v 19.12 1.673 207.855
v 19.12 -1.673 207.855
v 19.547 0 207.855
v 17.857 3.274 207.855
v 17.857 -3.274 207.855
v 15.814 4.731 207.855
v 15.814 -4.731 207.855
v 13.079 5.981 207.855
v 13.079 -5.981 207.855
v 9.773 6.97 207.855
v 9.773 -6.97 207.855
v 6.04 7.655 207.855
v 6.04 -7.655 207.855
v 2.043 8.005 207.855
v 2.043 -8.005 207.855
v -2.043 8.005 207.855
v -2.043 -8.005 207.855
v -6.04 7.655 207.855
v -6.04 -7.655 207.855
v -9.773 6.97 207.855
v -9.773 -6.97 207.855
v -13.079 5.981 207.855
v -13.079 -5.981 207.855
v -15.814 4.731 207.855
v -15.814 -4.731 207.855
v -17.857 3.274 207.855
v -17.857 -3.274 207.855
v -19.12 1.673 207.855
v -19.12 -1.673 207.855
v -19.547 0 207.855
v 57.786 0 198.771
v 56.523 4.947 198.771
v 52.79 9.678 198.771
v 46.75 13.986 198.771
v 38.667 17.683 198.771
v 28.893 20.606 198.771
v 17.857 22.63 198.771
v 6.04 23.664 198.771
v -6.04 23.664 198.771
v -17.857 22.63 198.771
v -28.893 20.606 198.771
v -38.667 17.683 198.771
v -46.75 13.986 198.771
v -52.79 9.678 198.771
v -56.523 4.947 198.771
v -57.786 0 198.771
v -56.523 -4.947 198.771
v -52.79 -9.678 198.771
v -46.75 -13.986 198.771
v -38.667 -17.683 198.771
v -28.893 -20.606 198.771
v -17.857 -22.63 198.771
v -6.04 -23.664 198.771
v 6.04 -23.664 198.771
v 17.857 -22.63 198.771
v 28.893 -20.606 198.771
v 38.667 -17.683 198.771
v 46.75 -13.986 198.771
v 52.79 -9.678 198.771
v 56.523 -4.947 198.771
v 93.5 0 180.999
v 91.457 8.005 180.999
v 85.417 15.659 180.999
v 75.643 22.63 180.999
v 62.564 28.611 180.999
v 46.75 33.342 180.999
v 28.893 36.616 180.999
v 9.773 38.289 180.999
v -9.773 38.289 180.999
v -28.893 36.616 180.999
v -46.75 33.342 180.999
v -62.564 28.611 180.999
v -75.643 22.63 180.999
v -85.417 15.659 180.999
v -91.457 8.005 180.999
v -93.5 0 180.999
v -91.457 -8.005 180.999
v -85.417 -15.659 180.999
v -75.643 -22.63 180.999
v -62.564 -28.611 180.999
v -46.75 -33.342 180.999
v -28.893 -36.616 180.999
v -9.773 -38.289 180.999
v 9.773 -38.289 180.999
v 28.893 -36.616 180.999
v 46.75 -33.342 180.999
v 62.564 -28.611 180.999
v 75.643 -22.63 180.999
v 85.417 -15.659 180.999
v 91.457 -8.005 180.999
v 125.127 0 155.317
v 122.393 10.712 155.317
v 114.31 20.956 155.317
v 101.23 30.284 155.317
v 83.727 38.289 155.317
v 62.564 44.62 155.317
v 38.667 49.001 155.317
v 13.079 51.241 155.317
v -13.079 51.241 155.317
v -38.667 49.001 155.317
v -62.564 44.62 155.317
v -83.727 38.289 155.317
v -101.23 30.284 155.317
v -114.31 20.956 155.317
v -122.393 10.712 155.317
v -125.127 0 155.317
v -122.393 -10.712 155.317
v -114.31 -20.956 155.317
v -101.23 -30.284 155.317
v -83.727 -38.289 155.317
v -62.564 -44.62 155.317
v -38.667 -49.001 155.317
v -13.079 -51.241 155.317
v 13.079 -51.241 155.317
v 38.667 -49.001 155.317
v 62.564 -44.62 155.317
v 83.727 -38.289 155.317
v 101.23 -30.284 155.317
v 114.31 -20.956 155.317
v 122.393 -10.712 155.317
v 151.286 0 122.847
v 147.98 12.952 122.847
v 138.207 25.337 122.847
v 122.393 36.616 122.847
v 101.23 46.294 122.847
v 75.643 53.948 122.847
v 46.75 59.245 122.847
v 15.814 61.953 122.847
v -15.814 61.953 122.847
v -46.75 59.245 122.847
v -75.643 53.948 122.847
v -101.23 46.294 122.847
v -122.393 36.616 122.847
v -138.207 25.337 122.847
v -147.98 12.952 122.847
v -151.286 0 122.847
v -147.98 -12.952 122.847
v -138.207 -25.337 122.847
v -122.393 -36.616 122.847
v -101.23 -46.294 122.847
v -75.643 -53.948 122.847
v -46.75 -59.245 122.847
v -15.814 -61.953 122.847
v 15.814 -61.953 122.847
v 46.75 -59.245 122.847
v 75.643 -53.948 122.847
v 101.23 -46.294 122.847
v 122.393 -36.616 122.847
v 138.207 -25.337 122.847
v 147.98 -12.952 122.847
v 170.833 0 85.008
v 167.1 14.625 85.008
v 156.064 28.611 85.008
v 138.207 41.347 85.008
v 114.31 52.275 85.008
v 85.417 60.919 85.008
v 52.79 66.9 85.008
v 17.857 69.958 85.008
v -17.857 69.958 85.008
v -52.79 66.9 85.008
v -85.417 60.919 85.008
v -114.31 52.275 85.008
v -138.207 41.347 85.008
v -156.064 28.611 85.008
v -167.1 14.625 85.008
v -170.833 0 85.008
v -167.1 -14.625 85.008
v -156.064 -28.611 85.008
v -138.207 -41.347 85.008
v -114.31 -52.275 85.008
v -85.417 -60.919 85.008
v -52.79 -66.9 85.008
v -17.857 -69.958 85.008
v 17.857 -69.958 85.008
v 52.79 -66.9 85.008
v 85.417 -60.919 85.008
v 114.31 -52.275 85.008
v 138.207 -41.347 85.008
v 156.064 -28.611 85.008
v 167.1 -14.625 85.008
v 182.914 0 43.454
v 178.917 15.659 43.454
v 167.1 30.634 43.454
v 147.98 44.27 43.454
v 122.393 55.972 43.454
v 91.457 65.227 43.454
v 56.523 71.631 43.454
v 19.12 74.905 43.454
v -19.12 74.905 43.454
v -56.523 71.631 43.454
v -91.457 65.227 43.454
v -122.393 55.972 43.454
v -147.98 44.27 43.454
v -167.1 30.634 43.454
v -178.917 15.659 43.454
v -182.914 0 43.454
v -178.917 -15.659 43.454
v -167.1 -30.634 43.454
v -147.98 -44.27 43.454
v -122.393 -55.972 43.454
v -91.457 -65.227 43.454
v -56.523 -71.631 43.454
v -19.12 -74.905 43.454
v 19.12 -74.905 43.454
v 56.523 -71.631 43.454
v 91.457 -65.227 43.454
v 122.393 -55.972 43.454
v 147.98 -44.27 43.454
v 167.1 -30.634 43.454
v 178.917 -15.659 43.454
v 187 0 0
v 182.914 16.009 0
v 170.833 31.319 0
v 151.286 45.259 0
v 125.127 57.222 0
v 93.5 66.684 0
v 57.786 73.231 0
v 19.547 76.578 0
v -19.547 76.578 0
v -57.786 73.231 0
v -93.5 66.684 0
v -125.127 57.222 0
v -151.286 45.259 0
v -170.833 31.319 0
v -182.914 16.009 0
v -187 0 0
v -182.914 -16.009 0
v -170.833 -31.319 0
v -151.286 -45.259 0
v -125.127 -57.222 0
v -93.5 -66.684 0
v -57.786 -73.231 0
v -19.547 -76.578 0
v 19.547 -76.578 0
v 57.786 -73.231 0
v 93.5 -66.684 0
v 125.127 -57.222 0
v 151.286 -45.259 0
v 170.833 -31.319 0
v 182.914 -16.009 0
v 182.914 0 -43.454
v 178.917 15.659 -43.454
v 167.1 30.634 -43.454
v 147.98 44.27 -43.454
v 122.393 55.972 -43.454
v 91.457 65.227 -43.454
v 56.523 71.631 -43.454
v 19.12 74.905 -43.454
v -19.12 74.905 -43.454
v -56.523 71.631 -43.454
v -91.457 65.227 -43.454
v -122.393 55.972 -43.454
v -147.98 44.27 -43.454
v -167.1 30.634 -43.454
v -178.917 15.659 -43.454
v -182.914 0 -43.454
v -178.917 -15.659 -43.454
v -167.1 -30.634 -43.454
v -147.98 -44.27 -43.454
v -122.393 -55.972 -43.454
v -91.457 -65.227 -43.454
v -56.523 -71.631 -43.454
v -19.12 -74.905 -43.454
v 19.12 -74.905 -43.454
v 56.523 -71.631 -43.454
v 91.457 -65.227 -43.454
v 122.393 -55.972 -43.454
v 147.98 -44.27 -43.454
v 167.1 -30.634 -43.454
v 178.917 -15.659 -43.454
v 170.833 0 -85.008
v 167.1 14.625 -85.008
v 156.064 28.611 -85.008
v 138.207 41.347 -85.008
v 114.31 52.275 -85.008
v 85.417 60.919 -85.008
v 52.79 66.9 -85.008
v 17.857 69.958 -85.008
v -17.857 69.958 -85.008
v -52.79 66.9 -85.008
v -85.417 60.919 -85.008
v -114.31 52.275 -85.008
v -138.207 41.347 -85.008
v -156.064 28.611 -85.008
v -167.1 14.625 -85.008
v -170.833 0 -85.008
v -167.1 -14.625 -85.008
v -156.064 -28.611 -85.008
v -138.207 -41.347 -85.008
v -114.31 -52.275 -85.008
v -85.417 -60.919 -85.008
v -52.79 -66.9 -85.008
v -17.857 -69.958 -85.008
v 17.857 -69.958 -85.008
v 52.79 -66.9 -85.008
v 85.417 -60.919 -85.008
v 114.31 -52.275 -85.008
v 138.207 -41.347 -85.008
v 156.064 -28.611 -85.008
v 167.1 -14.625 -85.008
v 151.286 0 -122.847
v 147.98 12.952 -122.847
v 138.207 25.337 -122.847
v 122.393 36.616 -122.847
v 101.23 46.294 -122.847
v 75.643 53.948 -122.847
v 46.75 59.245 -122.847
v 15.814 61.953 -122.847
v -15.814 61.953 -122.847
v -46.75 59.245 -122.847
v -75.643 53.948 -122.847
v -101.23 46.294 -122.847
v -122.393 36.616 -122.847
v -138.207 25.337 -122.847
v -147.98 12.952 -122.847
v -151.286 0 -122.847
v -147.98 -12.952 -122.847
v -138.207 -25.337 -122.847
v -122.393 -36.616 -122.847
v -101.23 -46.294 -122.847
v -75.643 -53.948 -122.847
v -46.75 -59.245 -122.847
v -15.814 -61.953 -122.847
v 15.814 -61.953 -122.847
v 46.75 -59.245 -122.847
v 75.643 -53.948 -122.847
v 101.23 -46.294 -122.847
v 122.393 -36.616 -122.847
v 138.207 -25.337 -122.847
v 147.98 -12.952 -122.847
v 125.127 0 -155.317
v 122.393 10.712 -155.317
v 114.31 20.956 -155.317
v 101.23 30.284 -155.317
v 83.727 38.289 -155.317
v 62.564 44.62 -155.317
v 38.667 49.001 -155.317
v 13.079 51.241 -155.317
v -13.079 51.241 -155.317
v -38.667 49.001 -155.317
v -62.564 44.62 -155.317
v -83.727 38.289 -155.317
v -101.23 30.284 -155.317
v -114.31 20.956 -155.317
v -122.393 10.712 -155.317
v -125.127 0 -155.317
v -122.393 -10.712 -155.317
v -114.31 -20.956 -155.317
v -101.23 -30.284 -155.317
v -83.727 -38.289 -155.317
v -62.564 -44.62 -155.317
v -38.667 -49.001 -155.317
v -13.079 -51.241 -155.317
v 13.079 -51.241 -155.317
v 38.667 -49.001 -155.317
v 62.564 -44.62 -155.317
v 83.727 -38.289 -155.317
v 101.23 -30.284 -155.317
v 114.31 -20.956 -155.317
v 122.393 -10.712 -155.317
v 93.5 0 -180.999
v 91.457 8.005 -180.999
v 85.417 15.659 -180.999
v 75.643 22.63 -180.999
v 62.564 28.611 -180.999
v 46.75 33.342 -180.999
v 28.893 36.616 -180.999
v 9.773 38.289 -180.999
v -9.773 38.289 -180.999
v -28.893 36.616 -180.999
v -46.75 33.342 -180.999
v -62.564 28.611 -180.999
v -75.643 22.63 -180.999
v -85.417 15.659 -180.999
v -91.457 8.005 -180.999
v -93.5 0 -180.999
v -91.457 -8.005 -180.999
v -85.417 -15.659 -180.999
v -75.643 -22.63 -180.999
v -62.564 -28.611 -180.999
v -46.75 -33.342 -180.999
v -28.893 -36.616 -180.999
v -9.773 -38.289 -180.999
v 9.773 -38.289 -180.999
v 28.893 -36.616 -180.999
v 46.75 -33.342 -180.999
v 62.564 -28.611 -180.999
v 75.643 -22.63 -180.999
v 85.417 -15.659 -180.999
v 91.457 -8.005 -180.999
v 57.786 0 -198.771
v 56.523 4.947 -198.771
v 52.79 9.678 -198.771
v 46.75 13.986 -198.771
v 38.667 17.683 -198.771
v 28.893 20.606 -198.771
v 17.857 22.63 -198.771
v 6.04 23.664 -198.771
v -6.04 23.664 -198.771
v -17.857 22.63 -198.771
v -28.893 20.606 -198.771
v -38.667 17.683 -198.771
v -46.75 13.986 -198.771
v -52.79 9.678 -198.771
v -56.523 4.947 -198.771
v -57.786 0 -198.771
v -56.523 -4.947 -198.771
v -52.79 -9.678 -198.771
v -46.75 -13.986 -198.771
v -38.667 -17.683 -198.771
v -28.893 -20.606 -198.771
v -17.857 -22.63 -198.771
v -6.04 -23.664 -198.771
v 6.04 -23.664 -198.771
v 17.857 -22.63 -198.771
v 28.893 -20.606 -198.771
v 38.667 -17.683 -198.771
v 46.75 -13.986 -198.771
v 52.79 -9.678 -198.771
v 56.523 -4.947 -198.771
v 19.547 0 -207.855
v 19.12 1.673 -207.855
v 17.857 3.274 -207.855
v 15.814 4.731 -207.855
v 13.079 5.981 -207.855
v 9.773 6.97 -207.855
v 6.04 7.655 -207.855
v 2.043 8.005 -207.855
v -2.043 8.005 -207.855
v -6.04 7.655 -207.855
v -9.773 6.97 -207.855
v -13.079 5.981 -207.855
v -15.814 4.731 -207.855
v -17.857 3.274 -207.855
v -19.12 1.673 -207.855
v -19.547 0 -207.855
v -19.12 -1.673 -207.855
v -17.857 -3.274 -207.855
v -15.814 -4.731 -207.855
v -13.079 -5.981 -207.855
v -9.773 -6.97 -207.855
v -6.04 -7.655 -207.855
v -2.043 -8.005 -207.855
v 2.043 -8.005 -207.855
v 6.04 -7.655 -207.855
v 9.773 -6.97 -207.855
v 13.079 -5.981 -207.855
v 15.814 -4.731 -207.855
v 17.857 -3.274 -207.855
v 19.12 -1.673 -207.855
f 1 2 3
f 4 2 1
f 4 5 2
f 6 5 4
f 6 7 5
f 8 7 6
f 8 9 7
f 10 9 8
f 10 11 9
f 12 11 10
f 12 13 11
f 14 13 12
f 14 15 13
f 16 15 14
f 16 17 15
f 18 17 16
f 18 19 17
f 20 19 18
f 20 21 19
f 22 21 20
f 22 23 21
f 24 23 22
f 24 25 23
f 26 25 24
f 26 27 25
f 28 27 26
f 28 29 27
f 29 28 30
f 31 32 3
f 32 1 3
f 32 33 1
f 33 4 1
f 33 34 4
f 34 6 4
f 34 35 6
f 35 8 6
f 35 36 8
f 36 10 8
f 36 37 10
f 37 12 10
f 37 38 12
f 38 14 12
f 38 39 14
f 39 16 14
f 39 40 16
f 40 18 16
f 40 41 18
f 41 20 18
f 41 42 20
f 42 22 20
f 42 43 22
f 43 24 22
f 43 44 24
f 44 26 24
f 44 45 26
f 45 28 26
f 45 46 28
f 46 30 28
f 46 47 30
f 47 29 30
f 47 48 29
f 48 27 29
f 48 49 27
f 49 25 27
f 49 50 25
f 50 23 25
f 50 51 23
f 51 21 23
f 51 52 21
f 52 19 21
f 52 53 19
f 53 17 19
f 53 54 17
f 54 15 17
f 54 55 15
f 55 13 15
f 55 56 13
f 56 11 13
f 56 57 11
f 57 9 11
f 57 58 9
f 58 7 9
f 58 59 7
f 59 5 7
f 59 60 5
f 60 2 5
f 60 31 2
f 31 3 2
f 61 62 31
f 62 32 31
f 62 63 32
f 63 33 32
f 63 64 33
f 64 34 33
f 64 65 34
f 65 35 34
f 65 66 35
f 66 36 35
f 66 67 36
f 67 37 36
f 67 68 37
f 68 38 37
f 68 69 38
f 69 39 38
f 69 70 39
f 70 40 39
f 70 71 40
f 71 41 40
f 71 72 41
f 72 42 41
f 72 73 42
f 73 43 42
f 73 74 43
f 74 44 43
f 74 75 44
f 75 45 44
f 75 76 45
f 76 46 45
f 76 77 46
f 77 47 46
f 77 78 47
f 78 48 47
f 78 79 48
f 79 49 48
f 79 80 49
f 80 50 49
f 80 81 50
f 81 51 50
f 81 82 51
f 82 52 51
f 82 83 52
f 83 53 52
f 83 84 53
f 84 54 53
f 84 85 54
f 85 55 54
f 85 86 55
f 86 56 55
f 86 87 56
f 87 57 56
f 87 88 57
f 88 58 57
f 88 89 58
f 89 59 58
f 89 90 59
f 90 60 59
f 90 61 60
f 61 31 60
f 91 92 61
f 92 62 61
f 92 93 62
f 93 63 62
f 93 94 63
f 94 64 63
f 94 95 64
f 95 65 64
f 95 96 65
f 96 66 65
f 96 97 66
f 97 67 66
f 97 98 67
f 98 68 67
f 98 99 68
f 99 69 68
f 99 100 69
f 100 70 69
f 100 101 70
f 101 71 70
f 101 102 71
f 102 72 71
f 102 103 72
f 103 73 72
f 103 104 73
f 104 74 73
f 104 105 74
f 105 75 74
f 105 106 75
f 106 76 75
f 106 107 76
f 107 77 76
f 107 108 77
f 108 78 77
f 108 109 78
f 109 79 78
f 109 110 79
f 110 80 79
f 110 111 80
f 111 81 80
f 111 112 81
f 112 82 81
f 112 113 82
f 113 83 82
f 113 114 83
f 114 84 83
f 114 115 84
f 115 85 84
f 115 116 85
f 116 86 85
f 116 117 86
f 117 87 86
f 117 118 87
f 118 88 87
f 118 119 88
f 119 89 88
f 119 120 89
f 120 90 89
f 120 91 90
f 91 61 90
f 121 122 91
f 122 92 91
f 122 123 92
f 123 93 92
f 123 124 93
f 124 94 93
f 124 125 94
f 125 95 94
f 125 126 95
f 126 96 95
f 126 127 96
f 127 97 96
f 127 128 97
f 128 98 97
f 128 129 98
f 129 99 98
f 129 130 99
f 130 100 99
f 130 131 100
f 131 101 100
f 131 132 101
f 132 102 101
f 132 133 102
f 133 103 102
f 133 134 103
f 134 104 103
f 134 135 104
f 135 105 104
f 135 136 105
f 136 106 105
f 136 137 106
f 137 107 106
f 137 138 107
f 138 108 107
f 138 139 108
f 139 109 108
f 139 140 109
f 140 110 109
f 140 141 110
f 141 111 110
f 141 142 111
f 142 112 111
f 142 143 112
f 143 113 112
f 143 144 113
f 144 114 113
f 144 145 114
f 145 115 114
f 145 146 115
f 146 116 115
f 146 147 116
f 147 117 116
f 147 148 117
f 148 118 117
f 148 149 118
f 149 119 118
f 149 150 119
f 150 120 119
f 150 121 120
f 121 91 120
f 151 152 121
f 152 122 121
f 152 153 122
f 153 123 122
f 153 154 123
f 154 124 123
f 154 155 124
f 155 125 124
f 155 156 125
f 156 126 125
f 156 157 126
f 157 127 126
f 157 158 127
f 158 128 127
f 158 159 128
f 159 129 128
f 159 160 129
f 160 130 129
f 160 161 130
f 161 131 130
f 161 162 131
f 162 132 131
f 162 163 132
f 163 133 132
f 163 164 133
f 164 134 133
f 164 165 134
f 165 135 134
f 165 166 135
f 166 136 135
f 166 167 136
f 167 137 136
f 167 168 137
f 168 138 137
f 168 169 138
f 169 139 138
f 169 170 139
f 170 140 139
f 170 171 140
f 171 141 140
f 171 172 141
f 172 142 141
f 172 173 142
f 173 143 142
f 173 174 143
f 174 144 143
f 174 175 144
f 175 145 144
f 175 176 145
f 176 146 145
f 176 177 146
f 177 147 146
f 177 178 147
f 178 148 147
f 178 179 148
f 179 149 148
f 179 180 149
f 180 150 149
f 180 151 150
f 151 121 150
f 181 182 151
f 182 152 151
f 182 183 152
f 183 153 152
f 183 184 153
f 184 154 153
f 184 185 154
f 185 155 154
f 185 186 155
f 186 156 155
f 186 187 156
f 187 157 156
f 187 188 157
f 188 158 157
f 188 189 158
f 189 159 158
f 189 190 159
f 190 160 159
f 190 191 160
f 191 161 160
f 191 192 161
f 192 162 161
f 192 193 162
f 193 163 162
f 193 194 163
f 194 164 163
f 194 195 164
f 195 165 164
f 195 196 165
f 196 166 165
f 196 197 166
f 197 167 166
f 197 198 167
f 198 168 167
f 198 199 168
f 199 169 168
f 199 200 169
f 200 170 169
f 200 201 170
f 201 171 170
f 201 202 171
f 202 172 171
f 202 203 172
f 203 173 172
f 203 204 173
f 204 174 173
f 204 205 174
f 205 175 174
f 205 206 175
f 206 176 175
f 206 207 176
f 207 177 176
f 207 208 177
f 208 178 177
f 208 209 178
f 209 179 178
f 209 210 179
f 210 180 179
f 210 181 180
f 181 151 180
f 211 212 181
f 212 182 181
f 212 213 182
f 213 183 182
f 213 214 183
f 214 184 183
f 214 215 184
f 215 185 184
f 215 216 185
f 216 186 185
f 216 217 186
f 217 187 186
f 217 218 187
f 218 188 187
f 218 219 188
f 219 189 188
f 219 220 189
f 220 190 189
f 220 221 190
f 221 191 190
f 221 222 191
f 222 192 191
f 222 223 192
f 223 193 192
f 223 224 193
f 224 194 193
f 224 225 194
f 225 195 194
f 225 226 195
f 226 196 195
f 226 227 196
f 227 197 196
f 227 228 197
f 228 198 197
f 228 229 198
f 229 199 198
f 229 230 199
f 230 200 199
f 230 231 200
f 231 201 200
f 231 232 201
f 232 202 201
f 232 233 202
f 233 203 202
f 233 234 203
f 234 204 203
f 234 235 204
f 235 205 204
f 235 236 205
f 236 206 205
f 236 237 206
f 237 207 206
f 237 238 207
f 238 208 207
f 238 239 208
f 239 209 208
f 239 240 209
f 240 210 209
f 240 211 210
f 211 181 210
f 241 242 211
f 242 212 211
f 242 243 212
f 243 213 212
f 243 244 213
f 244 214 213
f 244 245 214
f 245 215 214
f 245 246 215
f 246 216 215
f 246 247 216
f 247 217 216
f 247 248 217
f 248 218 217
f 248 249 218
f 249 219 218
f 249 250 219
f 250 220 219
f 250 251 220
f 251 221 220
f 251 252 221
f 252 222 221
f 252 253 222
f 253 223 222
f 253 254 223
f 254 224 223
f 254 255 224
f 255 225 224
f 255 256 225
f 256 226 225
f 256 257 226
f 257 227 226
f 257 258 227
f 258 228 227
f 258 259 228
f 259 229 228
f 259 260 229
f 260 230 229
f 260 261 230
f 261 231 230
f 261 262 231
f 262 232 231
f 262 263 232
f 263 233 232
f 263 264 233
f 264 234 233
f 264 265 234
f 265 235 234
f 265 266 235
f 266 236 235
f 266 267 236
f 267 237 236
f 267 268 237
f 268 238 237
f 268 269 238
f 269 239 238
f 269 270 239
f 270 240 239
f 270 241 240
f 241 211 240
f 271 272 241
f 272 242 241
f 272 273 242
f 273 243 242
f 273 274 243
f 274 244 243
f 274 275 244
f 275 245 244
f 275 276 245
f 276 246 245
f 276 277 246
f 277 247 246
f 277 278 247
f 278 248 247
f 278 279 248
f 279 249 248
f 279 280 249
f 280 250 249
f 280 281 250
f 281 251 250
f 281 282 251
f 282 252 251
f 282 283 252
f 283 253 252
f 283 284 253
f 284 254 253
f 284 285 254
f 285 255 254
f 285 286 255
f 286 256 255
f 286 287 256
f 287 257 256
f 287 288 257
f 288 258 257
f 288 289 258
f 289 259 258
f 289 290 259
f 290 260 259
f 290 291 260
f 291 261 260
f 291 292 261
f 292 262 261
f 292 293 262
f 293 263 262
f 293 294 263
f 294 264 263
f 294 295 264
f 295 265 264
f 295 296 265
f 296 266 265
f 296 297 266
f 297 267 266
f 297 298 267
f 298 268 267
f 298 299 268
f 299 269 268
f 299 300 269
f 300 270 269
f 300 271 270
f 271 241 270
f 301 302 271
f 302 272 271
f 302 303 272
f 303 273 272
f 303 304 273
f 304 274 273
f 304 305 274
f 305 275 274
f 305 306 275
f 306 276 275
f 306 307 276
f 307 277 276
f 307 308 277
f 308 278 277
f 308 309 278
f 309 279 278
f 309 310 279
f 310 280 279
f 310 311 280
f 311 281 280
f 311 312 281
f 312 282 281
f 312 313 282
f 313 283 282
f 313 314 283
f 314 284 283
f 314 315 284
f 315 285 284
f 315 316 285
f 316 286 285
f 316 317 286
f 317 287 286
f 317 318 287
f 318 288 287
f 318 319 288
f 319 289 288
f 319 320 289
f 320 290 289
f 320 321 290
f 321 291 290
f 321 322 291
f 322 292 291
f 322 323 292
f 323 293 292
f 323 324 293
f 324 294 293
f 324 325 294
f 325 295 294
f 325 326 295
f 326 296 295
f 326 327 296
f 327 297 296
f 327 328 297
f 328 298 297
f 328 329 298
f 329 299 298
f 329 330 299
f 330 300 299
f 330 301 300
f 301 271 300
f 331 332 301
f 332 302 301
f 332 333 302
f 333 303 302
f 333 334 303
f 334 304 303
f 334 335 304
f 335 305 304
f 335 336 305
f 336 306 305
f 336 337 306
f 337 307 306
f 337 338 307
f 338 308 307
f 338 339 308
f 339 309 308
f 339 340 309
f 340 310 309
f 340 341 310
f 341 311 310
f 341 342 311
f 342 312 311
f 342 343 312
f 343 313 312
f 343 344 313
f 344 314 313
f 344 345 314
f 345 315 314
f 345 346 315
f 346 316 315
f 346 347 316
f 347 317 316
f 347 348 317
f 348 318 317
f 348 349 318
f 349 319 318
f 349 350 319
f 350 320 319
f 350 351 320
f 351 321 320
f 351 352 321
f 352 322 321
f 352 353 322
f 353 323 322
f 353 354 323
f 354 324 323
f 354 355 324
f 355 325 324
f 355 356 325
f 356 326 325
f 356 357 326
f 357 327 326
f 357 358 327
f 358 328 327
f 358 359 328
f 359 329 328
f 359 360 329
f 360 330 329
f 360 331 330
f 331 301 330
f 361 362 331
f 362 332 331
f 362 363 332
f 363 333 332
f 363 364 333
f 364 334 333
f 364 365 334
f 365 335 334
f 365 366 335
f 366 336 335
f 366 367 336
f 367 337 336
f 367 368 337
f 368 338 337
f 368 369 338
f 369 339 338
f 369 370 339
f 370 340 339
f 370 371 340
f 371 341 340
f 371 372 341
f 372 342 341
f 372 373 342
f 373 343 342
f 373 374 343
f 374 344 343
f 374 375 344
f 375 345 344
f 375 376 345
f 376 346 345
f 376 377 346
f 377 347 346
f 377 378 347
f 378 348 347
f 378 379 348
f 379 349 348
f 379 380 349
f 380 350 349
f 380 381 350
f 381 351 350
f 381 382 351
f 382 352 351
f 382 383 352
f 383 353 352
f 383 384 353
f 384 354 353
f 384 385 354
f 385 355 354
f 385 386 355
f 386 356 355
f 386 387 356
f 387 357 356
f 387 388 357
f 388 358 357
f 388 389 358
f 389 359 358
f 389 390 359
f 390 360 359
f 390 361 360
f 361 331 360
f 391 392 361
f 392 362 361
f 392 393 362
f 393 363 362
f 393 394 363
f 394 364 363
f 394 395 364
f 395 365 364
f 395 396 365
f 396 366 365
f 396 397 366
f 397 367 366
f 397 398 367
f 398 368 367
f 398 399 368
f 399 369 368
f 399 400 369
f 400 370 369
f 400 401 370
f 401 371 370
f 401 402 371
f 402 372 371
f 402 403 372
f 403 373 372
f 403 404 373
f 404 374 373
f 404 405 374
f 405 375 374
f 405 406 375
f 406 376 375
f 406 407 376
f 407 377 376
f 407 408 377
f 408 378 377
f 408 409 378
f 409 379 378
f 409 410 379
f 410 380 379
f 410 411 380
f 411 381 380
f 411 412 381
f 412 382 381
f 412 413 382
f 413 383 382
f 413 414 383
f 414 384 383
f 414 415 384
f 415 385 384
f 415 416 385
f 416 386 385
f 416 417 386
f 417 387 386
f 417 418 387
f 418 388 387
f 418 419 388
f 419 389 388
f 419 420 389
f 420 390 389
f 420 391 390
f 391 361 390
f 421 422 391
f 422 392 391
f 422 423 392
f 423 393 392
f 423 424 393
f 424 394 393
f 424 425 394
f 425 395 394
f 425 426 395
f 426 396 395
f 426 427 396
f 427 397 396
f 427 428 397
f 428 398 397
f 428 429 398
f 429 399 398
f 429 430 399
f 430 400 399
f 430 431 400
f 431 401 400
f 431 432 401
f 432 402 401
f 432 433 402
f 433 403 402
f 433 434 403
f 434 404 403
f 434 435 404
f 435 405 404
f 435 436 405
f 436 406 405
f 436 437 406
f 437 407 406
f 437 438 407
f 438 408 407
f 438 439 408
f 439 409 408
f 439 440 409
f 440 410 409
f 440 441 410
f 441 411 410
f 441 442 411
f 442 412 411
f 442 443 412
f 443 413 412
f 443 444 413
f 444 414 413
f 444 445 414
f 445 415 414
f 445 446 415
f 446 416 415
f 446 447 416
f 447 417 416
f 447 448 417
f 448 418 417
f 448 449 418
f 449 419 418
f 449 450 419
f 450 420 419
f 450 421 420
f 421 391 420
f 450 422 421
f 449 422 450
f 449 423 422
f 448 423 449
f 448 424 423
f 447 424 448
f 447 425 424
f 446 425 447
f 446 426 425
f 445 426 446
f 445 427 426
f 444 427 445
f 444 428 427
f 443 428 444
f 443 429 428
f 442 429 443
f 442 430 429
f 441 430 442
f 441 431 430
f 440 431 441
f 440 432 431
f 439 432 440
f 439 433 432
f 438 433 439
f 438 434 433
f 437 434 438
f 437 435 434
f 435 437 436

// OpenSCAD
// Generated by SolidPython 1.0.1 on 2020-07-29 00:46:52


scale(v = [17, 7, 19]) {
	sphere(r = 11);
}
/***********************************************
*********      SolidPython code:      **********
************************************************
 
# import packages: SolidPython
from solid import *
from solid.utils import *
from itertools import chain, combinations, permutations


class Resize:

    def __init__(self, scad_file):
        self.scad_file = scad_file
        #self.scad_file = import_scad(scad_file)
        # cone/cylinder param:
        self.r1 = 0
        self.r2 = 0
        self.h = 0
        # rectangular prism param:
        self.w = 0
        self.l = 0
        # ellipse param:
        self.r = 0

    # import OpenScad code (file name corresponds to shape)


    # classify shape + parameters
    def assign(self, param1, param2, param3):
        if self.scad_file == 'cone.scad':
            self.r1 = param1
            self.r2 = param2
            self.h = param3
        elif self.scad_file == 'cylinder.scad':
            self.r1 = param1
            self.r2 = param2
            self.h = param3
        elif self.scad_file == 'rectangularPrism.scad':
            self.h = param1
            self.l = param2
            self.w = param3
        else:
            self.r = param1
            self.h = param2

    # resize parameters
    def iterate(self):
        x = range(3, 20, 2)
        i = 1
        if self.scad_file == 'cone.scad':
            tempList = list(permutations(x, 2))
            for temp in tempList:
                param1 = temp[0]
                param2 = temp[1]
                filepath = 'produced_scad_files/' + 'cone' + str(param1) + '_' + str(param2) + '_' + '.scad'
                scad_render_to_file(cylinder(h=param1, r1=param2, r2=0), filepath)

        elif self.scad_file == 'cylinder.scad':
            tempList = list(permutations(x, 3))
            for temp in tempList:
                param1 = temp[0]
                param2 = temp[1]
                filepath = 'produced_scad_files/' + 'cylinder' + str(param1) + '_' + str(param2) + '_' + '.scad'
                scad_render_to_file(cylinder(h=param1, r1=param2, r2=param2), filepath)

        elif self.scad_file == 'rectangularPrism.scad':
            tempList = list(permutations(x, 3))
            for temp in tempList:
                param1 = temp[0]
                param2 = temp[1]
                param3 = temp[2]
                filepath = 'produced_scad_files/' + 'rectangularPrism' + str(param1) + '_' + str(param2) + '_' + str(
                    param3) + '.scad'
                scad_render_to_file(cube(size=(param1, param2, param3)), filepath)

        elif self.scad_file == 'ellipse.scad':
            tempList = list(permutations(x, 4))
            for temp in tempList:
                param1 = temp[0]
                param2 = temp[1]
                param3 = temp[2]
                param4 = temp[3]
                filepath = 'produced_scad_files/' + 'ellipse' + str(param1) + '_' + str(param2) + '_' + str(param3) + '_' + str(param4) + '.scad'
                scad_render_to_file(scale([param1, param2, param3])(sphere(r=param4)), filepath)

    def render_to_scadfile(self):
        scad_render_to_file(scad, 'example.scad') 
 
************************************************/
